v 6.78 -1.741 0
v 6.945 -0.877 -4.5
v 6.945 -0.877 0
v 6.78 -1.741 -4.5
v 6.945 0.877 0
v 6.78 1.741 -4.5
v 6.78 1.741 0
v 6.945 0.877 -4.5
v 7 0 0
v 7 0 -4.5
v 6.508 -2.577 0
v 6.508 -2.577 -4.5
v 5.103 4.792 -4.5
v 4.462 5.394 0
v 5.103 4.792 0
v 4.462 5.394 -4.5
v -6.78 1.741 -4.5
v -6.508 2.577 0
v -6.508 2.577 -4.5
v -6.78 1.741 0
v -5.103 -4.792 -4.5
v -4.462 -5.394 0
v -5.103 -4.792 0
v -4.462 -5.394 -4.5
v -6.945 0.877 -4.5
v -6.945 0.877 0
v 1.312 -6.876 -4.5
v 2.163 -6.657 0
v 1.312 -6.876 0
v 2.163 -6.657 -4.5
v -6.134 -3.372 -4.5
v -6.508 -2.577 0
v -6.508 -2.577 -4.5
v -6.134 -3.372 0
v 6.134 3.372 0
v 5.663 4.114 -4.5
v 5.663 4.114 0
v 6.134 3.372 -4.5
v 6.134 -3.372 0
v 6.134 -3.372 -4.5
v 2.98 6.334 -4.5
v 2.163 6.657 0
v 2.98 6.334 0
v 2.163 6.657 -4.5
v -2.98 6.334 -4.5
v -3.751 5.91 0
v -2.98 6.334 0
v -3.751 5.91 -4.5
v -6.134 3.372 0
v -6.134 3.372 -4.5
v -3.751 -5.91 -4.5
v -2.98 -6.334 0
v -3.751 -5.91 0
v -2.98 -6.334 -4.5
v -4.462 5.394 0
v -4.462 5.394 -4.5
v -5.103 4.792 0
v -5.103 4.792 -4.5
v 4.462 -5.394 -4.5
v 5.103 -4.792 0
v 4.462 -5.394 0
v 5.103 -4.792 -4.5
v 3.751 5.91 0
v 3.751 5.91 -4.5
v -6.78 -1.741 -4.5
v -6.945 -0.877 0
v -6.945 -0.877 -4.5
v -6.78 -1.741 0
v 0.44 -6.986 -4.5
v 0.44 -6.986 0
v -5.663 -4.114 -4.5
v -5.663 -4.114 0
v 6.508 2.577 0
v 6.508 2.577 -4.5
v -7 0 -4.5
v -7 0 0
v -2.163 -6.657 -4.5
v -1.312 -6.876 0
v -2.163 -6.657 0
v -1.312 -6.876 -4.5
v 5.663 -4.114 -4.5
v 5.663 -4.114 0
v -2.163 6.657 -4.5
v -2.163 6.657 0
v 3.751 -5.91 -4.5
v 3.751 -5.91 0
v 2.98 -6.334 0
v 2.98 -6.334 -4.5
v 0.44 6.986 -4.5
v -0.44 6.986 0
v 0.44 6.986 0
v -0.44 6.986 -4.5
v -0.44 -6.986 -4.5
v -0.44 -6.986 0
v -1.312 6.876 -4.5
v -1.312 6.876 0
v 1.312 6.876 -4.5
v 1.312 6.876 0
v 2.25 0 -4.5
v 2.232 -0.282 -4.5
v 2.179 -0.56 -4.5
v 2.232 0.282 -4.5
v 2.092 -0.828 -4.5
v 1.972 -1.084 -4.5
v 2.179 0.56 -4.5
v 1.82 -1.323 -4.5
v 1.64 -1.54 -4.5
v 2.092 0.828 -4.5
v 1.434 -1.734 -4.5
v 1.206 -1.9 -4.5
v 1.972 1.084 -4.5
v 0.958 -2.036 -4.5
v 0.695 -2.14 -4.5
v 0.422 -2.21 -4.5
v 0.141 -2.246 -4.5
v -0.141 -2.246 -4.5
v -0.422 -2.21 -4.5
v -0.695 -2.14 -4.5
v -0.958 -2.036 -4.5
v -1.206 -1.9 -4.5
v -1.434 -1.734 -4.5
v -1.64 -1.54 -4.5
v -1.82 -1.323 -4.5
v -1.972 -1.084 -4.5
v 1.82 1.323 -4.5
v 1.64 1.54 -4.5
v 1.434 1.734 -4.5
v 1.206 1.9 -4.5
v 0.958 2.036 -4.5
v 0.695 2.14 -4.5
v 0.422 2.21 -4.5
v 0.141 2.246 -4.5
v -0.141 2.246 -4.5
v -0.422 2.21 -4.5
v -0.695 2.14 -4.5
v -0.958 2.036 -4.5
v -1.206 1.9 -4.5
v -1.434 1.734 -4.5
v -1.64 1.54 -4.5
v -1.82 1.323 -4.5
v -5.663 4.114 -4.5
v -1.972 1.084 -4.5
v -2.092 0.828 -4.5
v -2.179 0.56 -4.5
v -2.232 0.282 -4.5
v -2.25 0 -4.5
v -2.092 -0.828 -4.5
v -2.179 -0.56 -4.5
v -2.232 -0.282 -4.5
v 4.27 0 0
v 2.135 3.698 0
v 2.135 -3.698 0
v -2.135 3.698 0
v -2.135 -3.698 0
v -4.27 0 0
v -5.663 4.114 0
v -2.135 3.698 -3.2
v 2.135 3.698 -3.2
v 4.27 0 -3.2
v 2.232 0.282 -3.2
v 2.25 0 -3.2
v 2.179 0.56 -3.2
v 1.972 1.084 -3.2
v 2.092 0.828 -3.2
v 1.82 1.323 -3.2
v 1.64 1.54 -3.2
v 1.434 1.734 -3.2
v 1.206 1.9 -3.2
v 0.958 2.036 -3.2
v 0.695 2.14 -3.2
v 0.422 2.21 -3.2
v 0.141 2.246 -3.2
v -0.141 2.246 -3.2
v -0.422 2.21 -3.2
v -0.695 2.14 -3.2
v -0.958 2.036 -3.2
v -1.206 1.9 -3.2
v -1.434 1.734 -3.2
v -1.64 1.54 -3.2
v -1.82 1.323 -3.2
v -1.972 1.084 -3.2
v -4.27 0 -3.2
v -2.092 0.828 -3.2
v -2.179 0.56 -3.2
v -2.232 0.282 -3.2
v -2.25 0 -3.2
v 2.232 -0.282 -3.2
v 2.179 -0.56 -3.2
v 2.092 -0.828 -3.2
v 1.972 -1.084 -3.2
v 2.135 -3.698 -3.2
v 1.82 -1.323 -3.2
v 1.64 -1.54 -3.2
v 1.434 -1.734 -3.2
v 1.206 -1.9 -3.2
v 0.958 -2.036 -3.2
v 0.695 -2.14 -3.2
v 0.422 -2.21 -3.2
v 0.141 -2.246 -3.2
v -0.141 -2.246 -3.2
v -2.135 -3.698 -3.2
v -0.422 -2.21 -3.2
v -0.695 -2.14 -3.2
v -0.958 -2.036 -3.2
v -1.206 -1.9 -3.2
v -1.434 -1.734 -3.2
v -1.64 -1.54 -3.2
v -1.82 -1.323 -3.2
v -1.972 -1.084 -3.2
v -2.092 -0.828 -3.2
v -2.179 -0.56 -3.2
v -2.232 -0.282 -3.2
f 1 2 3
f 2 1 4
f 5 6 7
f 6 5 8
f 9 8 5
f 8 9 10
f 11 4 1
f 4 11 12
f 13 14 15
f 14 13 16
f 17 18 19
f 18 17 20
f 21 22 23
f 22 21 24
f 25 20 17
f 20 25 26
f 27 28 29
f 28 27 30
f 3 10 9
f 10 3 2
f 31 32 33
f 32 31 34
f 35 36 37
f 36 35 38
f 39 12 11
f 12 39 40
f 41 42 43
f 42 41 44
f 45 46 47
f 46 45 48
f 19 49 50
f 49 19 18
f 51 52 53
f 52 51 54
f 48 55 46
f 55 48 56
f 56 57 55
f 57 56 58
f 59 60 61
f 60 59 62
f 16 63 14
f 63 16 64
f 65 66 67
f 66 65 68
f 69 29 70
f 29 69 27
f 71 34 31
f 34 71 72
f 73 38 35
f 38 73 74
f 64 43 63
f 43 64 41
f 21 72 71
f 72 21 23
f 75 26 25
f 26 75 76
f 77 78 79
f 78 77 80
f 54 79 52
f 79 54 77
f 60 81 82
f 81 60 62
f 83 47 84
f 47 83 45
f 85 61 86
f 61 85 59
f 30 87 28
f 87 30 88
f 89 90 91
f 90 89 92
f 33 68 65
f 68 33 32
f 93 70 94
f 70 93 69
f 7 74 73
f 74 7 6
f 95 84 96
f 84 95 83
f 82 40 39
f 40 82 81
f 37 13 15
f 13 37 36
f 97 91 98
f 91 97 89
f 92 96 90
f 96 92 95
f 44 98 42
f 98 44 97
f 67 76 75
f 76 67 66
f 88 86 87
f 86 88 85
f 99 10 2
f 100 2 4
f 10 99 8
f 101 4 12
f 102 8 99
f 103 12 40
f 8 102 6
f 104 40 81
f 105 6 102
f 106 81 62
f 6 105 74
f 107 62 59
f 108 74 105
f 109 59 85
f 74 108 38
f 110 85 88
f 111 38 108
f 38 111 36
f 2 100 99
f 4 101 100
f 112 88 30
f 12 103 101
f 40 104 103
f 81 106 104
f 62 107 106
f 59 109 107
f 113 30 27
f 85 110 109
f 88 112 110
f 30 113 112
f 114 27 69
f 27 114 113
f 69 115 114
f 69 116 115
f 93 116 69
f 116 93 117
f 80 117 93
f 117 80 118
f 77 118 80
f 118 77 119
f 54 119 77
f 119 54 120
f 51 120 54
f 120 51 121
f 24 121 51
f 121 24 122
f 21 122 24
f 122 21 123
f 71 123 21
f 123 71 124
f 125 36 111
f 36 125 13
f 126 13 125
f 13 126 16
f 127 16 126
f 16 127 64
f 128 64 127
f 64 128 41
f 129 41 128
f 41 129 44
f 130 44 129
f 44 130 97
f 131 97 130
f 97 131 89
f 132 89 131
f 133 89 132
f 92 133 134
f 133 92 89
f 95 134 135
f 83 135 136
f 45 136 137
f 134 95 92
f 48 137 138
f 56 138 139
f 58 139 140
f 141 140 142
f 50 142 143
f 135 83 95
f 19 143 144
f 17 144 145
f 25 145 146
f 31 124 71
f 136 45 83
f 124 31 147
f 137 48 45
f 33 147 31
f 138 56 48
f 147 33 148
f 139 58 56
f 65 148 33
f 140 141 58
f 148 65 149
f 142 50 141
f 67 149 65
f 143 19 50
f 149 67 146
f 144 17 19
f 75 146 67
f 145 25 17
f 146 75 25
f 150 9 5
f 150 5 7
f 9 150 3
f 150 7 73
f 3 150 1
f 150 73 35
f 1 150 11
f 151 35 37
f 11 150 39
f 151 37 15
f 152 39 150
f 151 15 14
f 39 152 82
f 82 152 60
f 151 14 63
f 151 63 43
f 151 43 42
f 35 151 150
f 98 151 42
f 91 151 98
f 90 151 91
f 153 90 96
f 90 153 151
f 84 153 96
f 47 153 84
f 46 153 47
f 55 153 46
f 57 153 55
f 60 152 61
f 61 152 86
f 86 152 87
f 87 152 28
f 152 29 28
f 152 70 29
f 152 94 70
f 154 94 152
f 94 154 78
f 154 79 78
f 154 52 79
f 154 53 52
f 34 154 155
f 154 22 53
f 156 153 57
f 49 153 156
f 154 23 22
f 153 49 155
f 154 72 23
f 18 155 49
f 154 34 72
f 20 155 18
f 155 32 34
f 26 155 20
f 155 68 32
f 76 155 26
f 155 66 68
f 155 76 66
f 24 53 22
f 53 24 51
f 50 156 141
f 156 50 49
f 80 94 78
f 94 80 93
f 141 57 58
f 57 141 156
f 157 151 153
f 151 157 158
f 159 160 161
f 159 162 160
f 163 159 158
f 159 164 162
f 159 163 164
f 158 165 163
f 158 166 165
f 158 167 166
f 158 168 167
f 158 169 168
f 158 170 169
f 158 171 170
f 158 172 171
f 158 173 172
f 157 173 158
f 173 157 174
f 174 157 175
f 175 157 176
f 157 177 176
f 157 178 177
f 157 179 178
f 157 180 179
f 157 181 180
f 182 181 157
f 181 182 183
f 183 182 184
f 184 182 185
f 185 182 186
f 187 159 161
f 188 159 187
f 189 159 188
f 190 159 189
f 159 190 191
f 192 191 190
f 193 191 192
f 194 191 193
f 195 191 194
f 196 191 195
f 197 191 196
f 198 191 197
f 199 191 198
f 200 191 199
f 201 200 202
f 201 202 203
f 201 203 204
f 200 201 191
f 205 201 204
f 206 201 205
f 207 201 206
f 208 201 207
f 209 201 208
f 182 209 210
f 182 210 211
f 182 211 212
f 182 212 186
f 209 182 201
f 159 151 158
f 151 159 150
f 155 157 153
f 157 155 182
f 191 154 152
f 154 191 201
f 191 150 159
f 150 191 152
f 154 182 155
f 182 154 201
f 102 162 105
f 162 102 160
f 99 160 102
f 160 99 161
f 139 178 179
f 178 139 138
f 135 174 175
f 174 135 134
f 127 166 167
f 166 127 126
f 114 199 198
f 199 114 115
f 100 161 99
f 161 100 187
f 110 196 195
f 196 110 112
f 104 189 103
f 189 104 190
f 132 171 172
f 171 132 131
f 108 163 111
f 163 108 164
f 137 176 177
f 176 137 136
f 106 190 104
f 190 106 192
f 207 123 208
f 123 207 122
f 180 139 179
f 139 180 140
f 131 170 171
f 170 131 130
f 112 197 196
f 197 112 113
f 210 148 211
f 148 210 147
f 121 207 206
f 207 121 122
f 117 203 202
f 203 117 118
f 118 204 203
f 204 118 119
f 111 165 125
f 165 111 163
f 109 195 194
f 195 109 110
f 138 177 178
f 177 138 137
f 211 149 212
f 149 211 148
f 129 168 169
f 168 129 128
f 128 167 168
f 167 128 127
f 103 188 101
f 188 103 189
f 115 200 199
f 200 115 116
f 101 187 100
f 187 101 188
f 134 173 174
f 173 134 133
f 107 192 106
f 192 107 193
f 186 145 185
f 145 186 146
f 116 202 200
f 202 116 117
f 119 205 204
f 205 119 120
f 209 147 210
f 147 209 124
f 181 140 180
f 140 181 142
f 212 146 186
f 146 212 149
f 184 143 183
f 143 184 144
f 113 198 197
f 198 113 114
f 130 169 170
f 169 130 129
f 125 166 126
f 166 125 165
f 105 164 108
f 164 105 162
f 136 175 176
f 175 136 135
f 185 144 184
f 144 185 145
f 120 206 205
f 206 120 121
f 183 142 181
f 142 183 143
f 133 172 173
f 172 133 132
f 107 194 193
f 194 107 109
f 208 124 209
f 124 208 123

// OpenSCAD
$fn = 50;


difference() {
	union() {
		translate(v = [0, 0, -4.5000000000]) {
			cylinder(h = 4.5000000000, r = 7.0000000000);
		}
		translate(v = [0, 0, -3.0000000000]) {
			cylinder(h = 3, r = 2.8750000000);
		}
	}
	union() {
		translate(v = [0, 0, 0]) {
			rotate(a = [0, 0, 0]) {
				difference() {
					union() {
						translate(v = [0, 0, -3.2000000000]) {
							linear_extrude(height = 3.2000000000) {
								polygon(points = [[4.2698000000, 0.0000000000], [2.1349000000, 3.6977552691], [-2.1349000000, 3.6977552691], [-4.2698000000, 0.0000000000], [-2.1349000000, -3.6977552691], [2.1349000000, -3.6977552691]]);
							}
						}
					}
					union();
				}
			}
		}
		#translate(v = [0, 0, -100.0000000000]) {
			cylinder(h = 200, r = 2.2500000000);
		}
	}
}
